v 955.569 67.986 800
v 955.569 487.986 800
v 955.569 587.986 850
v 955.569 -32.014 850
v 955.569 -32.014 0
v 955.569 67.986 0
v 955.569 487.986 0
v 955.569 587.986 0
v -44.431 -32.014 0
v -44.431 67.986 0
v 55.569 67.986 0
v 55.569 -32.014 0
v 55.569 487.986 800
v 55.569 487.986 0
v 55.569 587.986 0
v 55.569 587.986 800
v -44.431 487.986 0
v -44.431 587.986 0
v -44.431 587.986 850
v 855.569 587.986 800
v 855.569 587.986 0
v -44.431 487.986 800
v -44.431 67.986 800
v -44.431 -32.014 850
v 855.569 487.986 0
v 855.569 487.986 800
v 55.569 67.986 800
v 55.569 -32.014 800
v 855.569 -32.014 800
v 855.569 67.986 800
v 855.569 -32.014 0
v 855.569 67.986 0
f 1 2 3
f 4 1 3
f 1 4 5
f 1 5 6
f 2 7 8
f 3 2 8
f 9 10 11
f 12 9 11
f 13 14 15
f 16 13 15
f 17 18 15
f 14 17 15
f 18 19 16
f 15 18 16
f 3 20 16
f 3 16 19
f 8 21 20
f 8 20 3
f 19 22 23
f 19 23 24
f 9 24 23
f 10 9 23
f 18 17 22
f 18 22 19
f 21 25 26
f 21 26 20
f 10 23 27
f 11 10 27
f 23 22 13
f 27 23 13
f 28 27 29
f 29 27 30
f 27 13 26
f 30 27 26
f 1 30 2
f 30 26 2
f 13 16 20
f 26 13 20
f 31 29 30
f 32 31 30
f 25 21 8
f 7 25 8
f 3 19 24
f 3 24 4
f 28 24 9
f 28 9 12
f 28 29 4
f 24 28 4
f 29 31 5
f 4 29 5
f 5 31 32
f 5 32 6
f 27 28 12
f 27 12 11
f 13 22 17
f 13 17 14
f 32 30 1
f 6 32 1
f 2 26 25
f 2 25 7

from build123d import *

# Parameters (mm, degrees)
F0_W     = 1000
F0_H     = 620
F1_DEPTH = 850
F2_W     = 1000
F2_H     = 420
F3_DEPTH = 800
F4_W     = 800
F4_H     = 620
F5_DEPTH = 800


with BuildPart() as f1:
    # F0 (on Top) → F1 (new body)
    with BuildSketch(Plane.XY):
        with Locations((455.56918, 277.985783)):
            Rectangle(F0_W, F0_H)
    extrude(amount=F1_DEPTH)

    # F2 (on Top) → F3 (cut)
    with BuildSketch(Plane.XY):
        with Locations((455.56918, 277.985783)):
            Rectangle(F2_W, F2_H)
    extrude(amount=F3_DEPTH, mode=Mode.SUBTRACT)

    # F4 (on Top) → F5 (cut)
    with BuildSketch(Plane.XY):
        with Locations((455.56918, 277.985783)):
            Rectangle(F4_W, F4_H)
    extrude(amount=F5_DEPTH, mode=Mode.SUBTRACT)


solid = f1.part
